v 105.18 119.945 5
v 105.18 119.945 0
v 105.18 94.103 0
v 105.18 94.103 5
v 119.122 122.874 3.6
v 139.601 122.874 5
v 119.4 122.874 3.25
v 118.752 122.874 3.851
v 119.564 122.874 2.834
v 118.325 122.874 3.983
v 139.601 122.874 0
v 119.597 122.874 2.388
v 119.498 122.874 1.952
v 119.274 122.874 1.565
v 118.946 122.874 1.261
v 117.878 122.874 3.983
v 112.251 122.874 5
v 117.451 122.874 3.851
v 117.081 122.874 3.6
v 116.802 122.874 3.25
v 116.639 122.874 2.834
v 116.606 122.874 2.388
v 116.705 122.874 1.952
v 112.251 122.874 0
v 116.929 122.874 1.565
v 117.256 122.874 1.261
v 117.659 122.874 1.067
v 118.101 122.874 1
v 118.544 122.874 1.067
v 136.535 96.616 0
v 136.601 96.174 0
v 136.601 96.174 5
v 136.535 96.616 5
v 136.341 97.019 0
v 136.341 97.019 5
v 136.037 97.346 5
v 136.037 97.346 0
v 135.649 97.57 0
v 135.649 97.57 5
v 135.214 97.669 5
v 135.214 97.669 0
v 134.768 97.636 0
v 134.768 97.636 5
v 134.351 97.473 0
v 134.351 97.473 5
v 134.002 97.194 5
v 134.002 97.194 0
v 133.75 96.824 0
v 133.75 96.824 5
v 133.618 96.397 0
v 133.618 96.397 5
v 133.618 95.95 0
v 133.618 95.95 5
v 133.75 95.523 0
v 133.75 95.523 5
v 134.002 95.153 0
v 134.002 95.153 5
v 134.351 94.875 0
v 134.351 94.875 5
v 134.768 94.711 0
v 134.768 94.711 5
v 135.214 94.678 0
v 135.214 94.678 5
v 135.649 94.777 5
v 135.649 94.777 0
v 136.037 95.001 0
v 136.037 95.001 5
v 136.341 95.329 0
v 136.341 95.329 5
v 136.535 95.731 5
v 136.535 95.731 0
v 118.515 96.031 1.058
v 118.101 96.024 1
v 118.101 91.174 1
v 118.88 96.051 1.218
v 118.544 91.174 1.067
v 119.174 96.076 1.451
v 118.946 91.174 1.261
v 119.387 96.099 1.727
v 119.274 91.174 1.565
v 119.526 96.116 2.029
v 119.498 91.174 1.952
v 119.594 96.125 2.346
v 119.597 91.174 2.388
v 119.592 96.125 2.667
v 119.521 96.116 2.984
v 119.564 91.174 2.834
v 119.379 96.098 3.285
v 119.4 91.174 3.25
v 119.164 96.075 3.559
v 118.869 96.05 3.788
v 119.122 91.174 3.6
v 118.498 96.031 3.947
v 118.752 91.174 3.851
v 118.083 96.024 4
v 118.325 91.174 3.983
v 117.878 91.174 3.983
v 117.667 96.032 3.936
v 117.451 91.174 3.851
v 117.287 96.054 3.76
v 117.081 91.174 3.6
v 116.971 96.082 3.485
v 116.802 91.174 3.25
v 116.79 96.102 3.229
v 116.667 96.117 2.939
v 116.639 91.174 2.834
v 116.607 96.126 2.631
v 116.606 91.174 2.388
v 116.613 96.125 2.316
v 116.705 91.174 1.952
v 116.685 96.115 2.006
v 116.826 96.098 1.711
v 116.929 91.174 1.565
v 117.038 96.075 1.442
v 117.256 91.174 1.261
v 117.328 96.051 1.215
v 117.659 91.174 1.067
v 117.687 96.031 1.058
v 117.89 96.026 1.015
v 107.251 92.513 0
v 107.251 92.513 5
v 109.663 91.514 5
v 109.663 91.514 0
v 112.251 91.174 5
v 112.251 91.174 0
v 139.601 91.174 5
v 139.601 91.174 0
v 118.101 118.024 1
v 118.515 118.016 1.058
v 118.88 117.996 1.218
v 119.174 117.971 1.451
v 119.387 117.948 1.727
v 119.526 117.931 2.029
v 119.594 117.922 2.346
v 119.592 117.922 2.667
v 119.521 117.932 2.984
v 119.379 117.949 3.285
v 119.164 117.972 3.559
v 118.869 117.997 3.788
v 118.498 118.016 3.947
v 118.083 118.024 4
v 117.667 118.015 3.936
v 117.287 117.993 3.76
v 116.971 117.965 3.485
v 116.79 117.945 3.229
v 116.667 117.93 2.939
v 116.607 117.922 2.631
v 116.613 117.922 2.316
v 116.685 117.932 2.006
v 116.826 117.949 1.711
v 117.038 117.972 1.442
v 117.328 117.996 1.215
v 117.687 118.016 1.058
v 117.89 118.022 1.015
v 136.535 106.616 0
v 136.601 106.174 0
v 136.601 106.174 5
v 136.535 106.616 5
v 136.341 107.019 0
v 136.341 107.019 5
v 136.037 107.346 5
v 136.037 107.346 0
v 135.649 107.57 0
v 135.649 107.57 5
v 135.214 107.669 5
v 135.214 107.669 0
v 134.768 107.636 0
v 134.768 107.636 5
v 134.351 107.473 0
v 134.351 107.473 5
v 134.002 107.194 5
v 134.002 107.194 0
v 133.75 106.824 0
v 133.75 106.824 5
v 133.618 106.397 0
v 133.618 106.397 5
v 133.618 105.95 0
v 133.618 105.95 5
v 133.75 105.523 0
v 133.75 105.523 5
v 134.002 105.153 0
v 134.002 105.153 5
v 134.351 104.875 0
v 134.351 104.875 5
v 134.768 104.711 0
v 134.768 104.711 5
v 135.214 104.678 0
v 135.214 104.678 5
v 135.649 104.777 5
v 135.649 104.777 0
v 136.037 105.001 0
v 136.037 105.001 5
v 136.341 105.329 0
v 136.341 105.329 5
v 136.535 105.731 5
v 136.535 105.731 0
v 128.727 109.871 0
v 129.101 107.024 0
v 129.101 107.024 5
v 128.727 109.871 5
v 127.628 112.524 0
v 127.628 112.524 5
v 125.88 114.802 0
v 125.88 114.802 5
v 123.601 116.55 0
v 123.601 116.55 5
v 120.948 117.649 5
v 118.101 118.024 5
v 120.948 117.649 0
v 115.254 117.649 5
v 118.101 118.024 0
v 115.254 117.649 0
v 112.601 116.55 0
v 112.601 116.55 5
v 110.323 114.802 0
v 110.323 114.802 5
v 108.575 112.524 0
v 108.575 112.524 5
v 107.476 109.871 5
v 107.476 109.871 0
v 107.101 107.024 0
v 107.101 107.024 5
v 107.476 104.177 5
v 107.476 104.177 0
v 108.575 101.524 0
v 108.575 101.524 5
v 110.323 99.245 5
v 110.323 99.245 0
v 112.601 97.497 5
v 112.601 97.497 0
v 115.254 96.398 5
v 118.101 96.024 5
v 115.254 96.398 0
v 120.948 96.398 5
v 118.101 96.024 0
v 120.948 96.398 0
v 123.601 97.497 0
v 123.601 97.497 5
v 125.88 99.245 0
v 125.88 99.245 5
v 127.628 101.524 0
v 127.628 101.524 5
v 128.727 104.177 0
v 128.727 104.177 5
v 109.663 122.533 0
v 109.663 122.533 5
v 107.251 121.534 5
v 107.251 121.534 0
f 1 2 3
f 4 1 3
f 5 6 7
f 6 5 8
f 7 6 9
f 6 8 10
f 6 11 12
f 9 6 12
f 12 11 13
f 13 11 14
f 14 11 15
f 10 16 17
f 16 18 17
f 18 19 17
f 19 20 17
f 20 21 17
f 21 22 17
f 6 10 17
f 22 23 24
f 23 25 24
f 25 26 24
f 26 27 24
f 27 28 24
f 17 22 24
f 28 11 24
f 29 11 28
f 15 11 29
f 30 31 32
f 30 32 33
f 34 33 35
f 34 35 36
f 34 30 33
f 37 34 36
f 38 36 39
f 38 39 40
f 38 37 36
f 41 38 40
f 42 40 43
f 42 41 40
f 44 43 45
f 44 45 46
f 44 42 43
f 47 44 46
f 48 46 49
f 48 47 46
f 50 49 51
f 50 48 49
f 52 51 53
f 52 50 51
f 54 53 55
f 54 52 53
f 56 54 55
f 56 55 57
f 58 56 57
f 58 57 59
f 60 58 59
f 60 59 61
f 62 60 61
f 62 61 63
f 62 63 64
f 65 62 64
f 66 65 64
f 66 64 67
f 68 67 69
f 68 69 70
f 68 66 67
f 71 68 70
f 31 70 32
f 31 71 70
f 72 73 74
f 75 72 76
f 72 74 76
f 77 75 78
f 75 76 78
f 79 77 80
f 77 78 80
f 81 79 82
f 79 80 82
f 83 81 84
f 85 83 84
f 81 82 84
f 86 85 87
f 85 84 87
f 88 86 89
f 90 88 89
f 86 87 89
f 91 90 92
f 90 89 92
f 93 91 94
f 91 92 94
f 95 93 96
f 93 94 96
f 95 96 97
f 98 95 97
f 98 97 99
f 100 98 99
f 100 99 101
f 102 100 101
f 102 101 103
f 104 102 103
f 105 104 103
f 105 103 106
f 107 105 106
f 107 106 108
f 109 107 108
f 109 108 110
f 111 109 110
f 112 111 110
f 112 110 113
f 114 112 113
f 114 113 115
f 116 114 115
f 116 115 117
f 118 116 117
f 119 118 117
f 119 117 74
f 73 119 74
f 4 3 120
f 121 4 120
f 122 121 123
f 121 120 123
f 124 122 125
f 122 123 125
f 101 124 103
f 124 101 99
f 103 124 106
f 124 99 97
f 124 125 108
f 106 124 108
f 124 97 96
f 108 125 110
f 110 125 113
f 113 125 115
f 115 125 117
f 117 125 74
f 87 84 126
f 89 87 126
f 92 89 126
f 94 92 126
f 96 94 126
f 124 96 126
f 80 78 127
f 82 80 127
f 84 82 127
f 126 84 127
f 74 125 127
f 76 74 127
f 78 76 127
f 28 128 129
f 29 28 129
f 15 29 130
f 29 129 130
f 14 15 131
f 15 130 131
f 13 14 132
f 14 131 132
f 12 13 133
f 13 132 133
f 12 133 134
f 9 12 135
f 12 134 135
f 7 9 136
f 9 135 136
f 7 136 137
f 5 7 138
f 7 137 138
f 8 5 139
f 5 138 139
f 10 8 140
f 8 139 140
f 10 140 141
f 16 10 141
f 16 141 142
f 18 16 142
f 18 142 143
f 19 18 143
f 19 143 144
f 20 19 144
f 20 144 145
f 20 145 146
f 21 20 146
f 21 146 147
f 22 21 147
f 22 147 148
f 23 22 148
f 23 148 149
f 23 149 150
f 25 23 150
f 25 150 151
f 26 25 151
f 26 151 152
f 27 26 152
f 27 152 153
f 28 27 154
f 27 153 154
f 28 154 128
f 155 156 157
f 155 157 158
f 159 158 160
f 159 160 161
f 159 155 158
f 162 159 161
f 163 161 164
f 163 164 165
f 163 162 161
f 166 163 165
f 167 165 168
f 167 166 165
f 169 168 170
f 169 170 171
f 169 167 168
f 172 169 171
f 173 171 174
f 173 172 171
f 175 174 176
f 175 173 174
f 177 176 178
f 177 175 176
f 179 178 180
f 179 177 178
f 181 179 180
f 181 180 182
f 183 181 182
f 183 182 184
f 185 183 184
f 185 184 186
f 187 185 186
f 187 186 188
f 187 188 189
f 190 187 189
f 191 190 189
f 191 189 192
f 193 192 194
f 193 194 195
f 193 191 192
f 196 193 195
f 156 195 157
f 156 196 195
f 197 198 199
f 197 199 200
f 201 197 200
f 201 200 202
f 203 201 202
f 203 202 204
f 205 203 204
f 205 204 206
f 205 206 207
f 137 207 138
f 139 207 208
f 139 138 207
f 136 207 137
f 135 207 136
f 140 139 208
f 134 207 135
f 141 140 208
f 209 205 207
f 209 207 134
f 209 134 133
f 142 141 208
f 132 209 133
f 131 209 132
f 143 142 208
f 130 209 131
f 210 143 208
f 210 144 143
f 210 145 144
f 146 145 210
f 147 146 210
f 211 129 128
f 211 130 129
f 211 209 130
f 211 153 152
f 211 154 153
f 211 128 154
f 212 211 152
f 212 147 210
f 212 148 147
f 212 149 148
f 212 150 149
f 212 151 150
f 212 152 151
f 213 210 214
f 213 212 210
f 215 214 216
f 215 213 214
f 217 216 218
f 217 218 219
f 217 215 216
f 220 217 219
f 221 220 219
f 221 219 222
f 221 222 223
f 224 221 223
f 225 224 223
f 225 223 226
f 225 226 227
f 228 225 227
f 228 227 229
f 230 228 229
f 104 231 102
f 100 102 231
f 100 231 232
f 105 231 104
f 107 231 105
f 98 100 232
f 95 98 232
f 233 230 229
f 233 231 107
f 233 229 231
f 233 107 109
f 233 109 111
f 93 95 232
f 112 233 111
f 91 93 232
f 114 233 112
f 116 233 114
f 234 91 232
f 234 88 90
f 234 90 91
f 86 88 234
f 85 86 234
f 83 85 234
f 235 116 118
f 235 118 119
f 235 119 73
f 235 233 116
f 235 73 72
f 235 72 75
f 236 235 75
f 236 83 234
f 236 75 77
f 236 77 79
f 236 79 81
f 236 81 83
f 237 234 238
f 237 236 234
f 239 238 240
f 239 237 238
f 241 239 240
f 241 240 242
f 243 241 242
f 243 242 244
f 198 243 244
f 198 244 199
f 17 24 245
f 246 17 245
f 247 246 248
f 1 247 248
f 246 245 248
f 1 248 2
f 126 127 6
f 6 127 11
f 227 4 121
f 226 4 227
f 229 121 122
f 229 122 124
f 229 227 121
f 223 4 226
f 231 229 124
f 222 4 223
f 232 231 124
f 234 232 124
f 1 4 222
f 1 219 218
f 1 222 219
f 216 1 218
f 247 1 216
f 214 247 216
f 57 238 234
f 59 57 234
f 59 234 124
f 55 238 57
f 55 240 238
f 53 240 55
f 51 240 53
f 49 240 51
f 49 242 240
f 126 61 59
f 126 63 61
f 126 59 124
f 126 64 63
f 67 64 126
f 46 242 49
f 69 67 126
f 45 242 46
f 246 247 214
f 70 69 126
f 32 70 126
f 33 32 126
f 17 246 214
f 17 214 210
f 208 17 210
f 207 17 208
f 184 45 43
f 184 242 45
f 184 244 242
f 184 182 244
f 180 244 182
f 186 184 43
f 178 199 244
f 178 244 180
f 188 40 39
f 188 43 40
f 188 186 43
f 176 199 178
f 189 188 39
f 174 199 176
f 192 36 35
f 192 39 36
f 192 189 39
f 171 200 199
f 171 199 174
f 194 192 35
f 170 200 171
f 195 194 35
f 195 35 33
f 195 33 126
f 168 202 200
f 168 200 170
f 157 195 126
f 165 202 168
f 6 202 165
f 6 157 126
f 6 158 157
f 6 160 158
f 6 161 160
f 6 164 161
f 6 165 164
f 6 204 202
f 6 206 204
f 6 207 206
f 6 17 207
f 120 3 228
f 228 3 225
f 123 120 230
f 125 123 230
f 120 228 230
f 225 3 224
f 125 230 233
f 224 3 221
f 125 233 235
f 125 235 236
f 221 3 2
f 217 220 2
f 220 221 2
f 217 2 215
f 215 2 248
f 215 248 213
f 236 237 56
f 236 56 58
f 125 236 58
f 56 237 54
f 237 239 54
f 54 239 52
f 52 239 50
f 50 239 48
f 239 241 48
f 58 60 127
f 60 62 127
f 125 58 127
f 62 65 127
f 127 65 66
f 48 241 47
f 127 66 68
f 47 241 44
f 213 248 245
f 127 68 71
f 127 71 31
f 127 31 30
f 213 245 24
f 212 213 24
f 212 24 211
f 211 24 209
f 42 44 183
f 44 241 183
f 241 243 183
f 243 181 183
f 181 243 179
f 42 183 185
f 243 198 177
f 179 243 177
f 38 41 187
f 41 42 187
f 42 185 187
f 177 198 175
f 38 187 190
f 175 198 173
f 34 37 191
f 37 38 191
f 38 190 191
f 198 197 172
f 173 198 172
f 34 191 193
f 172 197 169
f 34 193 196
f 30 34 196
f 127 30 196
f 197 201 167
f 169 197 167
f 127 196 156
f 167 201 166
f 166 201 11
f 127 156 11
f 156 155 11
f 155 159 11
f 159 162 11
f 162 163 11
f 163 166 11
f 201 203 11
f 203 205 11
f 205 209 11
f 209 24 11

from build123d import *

# Parameters (mm, degrees)
MODEL_R                 = 11
MODEL_R_2               = 1.5
SALIENTE_EXTRUIR1_DEPTH = 5
CROQUIS2_R              = 1.5
CORTAR_EXTRUIR1_DEPTH   = 35


with BuildPart() as part:
    # Model → Saliente-Extruir1 (new body)
    with BuildSketch(Plane.XY):
        with BuildLine():
            Line((112.251450395, 91.173573784), (133.951450395, 91.173573784))
            Line((133.951450395, 91.173573784), (139.601450395, 91.173573784))
            Line((139.601450395, 91.173573784), (139.601450395, 122.873573784))
            Line((139.601450395, 122.873573784), (133.951450395, 122.873573784))
            Line((133.951450395, 122.873573784), (112.251450395, 122.873573784))
            ThreePointArc((112.251450395, 122.873573784), (108.424616072, 122.112369109), (105.180382583, 119.944641596))
            Line((105.180382583, 119.944641596), (105.180382583, 94.102505972))
            ThreePointArc((105.180382583, 94.102505972), (108.424616072, 91.934778459), (112.251450395, 91.173573784))
        make_face()
        with Locations((118.101450395, 107.023573784)):
            Circle(MODEL_R, mode=Mode.SUBTRACT)
        with Locations((135.101450395, 106.173573784)):
            Circle(MODEL_R_2, mode=Mode.SUBTRACT)
        with Locations((135.101450395, 96.173573784)):
            Circle(MODEL_R_2, mode=Mode.SUBTRACT)
    extrude(amount=SALIENTE_EXTRUIR1_DEPTH)

    # Croquis2 → Cortar-Extruir1 (cut)
    with BuildSketch(Plane.XZ.offset(-91.173573784)):
        with Locations(Location((118.101450395, 2.5, 0), (0, 0, 270))):
            Circle(CROQUIS2_R)
    extrude(amount=-CORTAR_EXTRUIR1_DEPTH, mode=Mode.SUBTRACT)


solid = part.part
